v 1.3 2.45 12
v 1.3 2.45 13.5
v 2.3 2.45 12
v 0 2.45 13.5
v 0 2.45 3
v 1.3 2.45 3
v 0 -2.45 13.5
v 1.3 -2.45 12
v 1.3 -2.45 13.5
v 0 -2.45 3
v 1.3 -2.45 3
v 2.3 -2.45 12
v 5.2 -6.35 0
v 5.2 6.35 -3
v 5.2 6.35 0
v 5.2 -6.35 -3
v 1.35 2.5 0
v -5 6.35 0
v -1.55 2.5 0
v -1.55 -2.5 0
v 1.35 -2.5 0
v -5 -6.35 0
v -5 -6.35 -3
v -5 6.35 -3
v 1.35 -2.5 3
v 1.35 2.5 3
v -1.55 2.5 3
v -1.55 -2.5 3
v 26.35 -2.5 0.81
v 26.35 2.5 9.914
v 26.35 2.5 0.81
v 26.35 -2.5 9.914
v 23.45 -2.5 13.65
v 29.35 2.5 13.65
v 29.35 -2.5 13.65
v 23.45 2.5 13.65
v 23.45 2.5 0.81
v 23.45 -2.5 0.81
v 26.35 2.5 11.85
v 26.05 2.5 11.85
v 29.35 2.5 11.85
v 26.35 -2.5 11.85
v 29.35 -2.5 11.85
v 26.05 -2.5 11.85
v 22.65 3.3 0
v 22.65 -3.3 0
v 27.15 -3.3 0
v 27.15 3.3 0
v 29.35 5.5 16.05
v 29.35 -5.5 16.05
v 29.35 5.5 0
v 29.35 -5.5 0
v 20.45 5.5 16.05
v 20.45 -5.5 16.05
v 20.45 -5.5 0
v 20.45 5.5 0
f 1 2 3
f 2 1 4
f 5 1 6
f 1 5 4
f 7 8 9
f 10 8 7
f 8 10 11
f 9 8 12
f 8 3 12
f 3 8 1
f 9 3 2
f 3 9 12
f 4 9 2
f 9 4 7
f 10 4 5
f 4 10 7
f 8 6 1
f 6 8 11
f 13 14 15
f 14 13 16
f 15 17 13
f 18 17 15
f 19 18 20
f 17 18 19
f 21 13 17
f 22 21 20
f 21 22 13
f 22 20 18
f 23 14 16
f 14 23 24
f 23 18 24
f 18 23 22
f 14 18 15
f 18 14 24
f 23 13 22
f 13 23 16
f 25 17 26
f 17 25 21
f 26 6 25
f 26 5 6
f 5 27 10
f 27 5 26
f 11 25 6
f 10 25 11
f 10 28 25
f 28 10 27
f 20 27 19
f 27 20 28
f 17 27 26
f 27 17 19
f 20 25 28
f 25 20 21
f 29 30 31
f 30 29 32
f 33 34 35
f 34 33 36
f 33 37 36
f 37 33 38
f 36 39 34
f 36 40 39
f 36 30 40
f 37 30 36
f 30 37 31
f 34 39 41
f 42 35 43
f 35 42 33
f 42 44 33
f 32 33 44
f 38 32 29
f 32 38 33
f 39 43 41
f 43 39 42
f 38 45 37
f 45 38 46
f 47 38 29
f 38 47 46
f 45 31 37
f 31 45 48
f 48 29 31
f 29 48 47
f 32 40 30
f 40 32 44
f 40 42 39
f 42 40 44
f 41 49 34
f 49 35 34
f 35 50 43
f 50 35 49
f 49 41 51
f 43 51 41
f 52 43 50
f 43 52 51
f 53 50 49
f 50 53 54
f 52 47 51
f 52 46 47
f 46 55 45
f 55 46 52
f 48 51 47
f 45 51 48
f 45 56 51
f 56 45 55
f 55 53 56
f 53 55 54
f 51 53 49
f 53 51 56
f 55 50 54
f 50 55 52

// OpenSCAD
// ============================================================
// connector.scad — reusable cantilever snap-fit connector
//
// A self-contained, parametric component. Import it with `use`
// and call the modules; every dimension is a module argument
// that defaults to the globals below, so a consumer can override
// any of them per call without editing this file.
//
// MALE:   flexible arm with a hook. Hook underside is the flat
//         catch face; hook top is a ramp for tool-free insertion.
//         The male is printed `fit` mm undersize per side so it
//         is never a zero-clearance press fit.
// FEMALE: socket with a latch window through the front wall, plus
//         a shallow ramp-to-flat-ledge "catch lip" on the inner
//         wall (_|-|_). The head rides the ramp inward on the way
//         in, then its flat catch face drops onto the ledge and
//         locks. The window doubles as flathead-screwdriver access
//         (sized 5.0 x 1.8 x 3.0 mm deep by default).
//
// RELEASE: insert a flathead screwdriver into the front window,
//          push the head inward (toward the arm) to clear the
//          ledge, then pull the male down/out.
//
// Usage in your own designs:
//   use <snap_connector/connector.scad>   // from the parent dir
//   use <connector.scad>                  // from this dir
//   snap_male();                          // union into part A
//   difference(){ yourBody(); snap_female_cutout(wall=YOUR_WALL); }
//   ...or snap_female();                  // standalone socket block
// Override anything per call, e.g. snap_male(arm_w=6, fit=0.2).
//
// Both parts share the same origin: male fully inserted ==
// both modules placed at the same position/orientation. (The
// female's open bottom then sits flush on the male's base plate.)
//
// PRINTING (ASA):
// - Print the MALE on its side so layer lines run ALONG the
//   arm; printed upright, the hook shears off at a layer line.
// - clr (female) + fit (male) set the slip gap; tune those two
//   to taste. `back` keeps flex room when clr is shrunk.
// - Cantilever strain ~ 1.5 * arm_t * hook_d / arm_l^2.
//   Keep <= ~2% for ASA. Defaults: 1.5*1.2*1.0/12^2 = 1.25%.
// ============================================================

/* [Fit] */
clr   = 0.15;   // per-side clearance in the FEMALE cavity (smaller = tighter hole)
fit   = -0.10;  // per-side size offset on the MALE. POSITIVE = undersize (looser),
                // NEGATIVE = oversize (fatter/tighter). Net slip gap = clr + fit:
                //   0.25 / +0.15 -> 0.40/side (original: too loose, wouldn't snap)
                //   0.15 / -0.10 -> 0.05/side (tight: smaller hole + fatter male)
                // If it won't go together, raise fit toward 0 (or clr toward 0.20);
                // if still loose, push fit to -0.15.
slack = 0.15;   // vertical engagement slack (ledge sits this far below catch)
back  = 0.4;    // extra flex pocket behind the arm, so shrinking clr does NOT
                // starve the hook's deflection room (keeps it from jamming)

/* [Snap geometry] */
arm_w  = 4.7;   // arm width  (Y) -> latch window = arm_w + 2*clr = 5.0 mm wide
arm_t  = 1.2;   // arm thickness (X) -- thinned so the short arm can flex
arm_l  = 12;    // flexible arm length below the catch face
hook_d = 1.0;   // hook overhang (deflection distance)
hook_h = 1.5;   // hook ramp height -> latch window = hook_h + clr + slack = 1.8 mm tall
wall   = 3.0;   // female wall thickness -> latch window = 3.0 mm deep (screwdriver reach)
top_w  = 2.4;   // female top wall thickness
chm    = 0.8;   // entry chamfer on female opening

/* [Catch lip] */
lip_d  = 0.3;   // how far the female catch lip protrudes into the channel
lip_h  = 2.0;   // vertical run of the lip's lead-in ramp (slope = lip_d/lip_h)

eps = 0.01;

/* [Preview] */
part = "demo"; // [demo, male, female, assembled, cutout]

// ---------------------- MALE ----------------------
// Arm rises from z=0; catch face at z=arm_l; hook points +X.
module snap_male(arm_w=arm_w, arm_t=arm_t, arm_l=arm_l,
                 hook_d=hook_d, hook_h=hook_h, fit=fit,
                 base=true, base_pad=4, base_t=3,
                 plug=true, plug_h=3, plug_clr=0.0)  // 0 = fills cavity fully;
{                                                    // go negative for a press fit

    // Undersize the printed male so it slips into the female cavity.
    // Width loses `fit` per side; front face pulls back by `fit`.
    // The catch overhang `hook_d` is kept full so engagement on the
    // ledge is unchanged.
    mw = arm_w - 2*fit;          // male width (Y)
    mt = arm_t - fit;            // male front-face thickness (X)

    // arm + hook: 2D profile in XZ extruded across Y
    translate([0, mw/2, 0])
        rotate([90, 0, 0])
            linear_extrude(mw)
                polygon([
                    [0, 0],
                    [mt, 0],
                    [mt, arm_l],                 // front face
                    [mt + hook_d, arm_l],        // 90° catch face
                    [mt, arm_l + hook_h],        // insertion ramp
                    [0, arm_l + hook_h]
                ]);

    // optional mounting base (delete and union the arm into your part)
    if (base)
        translate([-(base_pad + hook_d), -arm_w/2 - base_pad, -base_t])
            cube([arm_t + hook_d + 2*base_pad,
                  arm_w + 2*base_pad,
                  base_t]);

    // bottom plug: almost-fills the female's LOWER cavity so the male
    // seats with no wobble (held at the base AND the hook). Sized to the
    // female channel (uses globals clr, back) minus plug_clr per side.
    if (plug) {
        pcx0 = -hook_d - clr - back;     // female channel back
        pcx1 = arm_t + clr;              // female channel front
        pcw  = arm_w + 2*clr;            // female channel width
        translate([pcx0 + plug_clr, -pcw/2 + plug_clr, 0])
            cube([(pcx1 - pcx0) - 2*plug_clr,
                  pcw - 2*plug_clr,
                  plug_h]);
    }
}

// ----------------- FEMALE (cavity) -----------------
// Subtract this from your own solid. The latch window extends
// `wall` in +X — pass your actual wall thickness if thicker,
// so the window goes all the way through for the screwdriver.
module snap_female_cutout(arm_w=arm_w, arm_t=arm_t, arm_l=arm_l,
                          hook_d=hook_d, hook_h=hook_h,
                          clr=clr, slack=slack, wall=wall, chm=chm,
                          lip_d=lip_d, lip_h=lip_h)
{
    cw  = arm_w + 2*clr;            // channel width
    cx0 = -hook_d - clr - back;     // channel back (room for deflection)
    cx1 = arm_t + clr;              // channel front inner face
    ch  = arm_l + hook_h + clr;     // channel height

    difference() {
        union() {
            // insertion channel (open at bottom, z=0)
            translate([cx0, -cw/2, -eps])
                cube([cx1 - cx0, cw, ch + eps]);

            // latch window through the front (+X) wall
            translate([cx1 - eps, -cw/2, arm_l - slack])
                cube([wall + 2*eps, cw, hook_h + clr + slack]);

            // entry chamfer around the opening
            hull() {
                translate([cx0 - chm, -cw/2 - chm, -eps])
                    cube([cx1 - cx0 + 2*chm, cw + 2*chm, eps]);
                translate([cx0, -cw/2, chm])
                    cube([cx1 - cx0, cw, eps]);
            }
        }

        // CATCH LIP — a shallow ramp on the inner front wall rising to
        // a flat ledge at the window bottom (the "_|-|_" detent). Carved
        // OUT of the channel so it stays as solid material whether the
        // socket is built standalone or this cutout is differenced from
        // your own body. On insertion the male head rides the ramp inward;
        // at the top its flat catch face drops onto the ledge and locks.
        translate([0, cw/2 + eps, 0])
            rotate([90, 0, 0])
                linear_extrude(cw + 2*eps)
                    polygon([
                        [cx1 + eps,   arm_l - slack - lip_h],  // ramp foot (at wall)
                        [cx1 + eps,   arm_l - slack],          // ledge outer
                        [cx1 - lip_d, arm_l - slack]           // ledge inner (protrudes)
                    ]);
    }
}

// --------------- FEMALE (standalone block) ---------------
module snap_female(arm_w=arm_w, arm_t=arm_t, arm_l=arm_l,
                   hook_d=hook_d, hook_h=hook_h,
                   clr=clr, slack=slack, wall=wall, top_w=top_w, chm=chm)
{
    cw  = arm_w + 2*clr;
    cx0 = -hook_d - clr - back;
    cx1 = arm_t + clr;
    ch  = arm_l + hook_h + clr;

    difference() {
        translate([cx0 - wall, -cw/2 - wall, 0])
            cube([(cx1 - cx0) + 2*wall, cw + 2*wall, ch + top_w]);
        snap_female_cutout(arm_w, arm_t, arm_l, hook_d, hook_h,
                           clr, slack, wall, chm);
    }
}

// ---------------------- PREVIEW ----------------------
if (part == "male")        snap_male();
else if (part == "female") snap_female();
else if (part == "cutout") snap_female_cutout();
else if (part == "assembled") { snap_male(); %snap_female(); }
else { // demo: side by side
    snap_male();
    translate([25, 0, 0]) snap_female();
}
